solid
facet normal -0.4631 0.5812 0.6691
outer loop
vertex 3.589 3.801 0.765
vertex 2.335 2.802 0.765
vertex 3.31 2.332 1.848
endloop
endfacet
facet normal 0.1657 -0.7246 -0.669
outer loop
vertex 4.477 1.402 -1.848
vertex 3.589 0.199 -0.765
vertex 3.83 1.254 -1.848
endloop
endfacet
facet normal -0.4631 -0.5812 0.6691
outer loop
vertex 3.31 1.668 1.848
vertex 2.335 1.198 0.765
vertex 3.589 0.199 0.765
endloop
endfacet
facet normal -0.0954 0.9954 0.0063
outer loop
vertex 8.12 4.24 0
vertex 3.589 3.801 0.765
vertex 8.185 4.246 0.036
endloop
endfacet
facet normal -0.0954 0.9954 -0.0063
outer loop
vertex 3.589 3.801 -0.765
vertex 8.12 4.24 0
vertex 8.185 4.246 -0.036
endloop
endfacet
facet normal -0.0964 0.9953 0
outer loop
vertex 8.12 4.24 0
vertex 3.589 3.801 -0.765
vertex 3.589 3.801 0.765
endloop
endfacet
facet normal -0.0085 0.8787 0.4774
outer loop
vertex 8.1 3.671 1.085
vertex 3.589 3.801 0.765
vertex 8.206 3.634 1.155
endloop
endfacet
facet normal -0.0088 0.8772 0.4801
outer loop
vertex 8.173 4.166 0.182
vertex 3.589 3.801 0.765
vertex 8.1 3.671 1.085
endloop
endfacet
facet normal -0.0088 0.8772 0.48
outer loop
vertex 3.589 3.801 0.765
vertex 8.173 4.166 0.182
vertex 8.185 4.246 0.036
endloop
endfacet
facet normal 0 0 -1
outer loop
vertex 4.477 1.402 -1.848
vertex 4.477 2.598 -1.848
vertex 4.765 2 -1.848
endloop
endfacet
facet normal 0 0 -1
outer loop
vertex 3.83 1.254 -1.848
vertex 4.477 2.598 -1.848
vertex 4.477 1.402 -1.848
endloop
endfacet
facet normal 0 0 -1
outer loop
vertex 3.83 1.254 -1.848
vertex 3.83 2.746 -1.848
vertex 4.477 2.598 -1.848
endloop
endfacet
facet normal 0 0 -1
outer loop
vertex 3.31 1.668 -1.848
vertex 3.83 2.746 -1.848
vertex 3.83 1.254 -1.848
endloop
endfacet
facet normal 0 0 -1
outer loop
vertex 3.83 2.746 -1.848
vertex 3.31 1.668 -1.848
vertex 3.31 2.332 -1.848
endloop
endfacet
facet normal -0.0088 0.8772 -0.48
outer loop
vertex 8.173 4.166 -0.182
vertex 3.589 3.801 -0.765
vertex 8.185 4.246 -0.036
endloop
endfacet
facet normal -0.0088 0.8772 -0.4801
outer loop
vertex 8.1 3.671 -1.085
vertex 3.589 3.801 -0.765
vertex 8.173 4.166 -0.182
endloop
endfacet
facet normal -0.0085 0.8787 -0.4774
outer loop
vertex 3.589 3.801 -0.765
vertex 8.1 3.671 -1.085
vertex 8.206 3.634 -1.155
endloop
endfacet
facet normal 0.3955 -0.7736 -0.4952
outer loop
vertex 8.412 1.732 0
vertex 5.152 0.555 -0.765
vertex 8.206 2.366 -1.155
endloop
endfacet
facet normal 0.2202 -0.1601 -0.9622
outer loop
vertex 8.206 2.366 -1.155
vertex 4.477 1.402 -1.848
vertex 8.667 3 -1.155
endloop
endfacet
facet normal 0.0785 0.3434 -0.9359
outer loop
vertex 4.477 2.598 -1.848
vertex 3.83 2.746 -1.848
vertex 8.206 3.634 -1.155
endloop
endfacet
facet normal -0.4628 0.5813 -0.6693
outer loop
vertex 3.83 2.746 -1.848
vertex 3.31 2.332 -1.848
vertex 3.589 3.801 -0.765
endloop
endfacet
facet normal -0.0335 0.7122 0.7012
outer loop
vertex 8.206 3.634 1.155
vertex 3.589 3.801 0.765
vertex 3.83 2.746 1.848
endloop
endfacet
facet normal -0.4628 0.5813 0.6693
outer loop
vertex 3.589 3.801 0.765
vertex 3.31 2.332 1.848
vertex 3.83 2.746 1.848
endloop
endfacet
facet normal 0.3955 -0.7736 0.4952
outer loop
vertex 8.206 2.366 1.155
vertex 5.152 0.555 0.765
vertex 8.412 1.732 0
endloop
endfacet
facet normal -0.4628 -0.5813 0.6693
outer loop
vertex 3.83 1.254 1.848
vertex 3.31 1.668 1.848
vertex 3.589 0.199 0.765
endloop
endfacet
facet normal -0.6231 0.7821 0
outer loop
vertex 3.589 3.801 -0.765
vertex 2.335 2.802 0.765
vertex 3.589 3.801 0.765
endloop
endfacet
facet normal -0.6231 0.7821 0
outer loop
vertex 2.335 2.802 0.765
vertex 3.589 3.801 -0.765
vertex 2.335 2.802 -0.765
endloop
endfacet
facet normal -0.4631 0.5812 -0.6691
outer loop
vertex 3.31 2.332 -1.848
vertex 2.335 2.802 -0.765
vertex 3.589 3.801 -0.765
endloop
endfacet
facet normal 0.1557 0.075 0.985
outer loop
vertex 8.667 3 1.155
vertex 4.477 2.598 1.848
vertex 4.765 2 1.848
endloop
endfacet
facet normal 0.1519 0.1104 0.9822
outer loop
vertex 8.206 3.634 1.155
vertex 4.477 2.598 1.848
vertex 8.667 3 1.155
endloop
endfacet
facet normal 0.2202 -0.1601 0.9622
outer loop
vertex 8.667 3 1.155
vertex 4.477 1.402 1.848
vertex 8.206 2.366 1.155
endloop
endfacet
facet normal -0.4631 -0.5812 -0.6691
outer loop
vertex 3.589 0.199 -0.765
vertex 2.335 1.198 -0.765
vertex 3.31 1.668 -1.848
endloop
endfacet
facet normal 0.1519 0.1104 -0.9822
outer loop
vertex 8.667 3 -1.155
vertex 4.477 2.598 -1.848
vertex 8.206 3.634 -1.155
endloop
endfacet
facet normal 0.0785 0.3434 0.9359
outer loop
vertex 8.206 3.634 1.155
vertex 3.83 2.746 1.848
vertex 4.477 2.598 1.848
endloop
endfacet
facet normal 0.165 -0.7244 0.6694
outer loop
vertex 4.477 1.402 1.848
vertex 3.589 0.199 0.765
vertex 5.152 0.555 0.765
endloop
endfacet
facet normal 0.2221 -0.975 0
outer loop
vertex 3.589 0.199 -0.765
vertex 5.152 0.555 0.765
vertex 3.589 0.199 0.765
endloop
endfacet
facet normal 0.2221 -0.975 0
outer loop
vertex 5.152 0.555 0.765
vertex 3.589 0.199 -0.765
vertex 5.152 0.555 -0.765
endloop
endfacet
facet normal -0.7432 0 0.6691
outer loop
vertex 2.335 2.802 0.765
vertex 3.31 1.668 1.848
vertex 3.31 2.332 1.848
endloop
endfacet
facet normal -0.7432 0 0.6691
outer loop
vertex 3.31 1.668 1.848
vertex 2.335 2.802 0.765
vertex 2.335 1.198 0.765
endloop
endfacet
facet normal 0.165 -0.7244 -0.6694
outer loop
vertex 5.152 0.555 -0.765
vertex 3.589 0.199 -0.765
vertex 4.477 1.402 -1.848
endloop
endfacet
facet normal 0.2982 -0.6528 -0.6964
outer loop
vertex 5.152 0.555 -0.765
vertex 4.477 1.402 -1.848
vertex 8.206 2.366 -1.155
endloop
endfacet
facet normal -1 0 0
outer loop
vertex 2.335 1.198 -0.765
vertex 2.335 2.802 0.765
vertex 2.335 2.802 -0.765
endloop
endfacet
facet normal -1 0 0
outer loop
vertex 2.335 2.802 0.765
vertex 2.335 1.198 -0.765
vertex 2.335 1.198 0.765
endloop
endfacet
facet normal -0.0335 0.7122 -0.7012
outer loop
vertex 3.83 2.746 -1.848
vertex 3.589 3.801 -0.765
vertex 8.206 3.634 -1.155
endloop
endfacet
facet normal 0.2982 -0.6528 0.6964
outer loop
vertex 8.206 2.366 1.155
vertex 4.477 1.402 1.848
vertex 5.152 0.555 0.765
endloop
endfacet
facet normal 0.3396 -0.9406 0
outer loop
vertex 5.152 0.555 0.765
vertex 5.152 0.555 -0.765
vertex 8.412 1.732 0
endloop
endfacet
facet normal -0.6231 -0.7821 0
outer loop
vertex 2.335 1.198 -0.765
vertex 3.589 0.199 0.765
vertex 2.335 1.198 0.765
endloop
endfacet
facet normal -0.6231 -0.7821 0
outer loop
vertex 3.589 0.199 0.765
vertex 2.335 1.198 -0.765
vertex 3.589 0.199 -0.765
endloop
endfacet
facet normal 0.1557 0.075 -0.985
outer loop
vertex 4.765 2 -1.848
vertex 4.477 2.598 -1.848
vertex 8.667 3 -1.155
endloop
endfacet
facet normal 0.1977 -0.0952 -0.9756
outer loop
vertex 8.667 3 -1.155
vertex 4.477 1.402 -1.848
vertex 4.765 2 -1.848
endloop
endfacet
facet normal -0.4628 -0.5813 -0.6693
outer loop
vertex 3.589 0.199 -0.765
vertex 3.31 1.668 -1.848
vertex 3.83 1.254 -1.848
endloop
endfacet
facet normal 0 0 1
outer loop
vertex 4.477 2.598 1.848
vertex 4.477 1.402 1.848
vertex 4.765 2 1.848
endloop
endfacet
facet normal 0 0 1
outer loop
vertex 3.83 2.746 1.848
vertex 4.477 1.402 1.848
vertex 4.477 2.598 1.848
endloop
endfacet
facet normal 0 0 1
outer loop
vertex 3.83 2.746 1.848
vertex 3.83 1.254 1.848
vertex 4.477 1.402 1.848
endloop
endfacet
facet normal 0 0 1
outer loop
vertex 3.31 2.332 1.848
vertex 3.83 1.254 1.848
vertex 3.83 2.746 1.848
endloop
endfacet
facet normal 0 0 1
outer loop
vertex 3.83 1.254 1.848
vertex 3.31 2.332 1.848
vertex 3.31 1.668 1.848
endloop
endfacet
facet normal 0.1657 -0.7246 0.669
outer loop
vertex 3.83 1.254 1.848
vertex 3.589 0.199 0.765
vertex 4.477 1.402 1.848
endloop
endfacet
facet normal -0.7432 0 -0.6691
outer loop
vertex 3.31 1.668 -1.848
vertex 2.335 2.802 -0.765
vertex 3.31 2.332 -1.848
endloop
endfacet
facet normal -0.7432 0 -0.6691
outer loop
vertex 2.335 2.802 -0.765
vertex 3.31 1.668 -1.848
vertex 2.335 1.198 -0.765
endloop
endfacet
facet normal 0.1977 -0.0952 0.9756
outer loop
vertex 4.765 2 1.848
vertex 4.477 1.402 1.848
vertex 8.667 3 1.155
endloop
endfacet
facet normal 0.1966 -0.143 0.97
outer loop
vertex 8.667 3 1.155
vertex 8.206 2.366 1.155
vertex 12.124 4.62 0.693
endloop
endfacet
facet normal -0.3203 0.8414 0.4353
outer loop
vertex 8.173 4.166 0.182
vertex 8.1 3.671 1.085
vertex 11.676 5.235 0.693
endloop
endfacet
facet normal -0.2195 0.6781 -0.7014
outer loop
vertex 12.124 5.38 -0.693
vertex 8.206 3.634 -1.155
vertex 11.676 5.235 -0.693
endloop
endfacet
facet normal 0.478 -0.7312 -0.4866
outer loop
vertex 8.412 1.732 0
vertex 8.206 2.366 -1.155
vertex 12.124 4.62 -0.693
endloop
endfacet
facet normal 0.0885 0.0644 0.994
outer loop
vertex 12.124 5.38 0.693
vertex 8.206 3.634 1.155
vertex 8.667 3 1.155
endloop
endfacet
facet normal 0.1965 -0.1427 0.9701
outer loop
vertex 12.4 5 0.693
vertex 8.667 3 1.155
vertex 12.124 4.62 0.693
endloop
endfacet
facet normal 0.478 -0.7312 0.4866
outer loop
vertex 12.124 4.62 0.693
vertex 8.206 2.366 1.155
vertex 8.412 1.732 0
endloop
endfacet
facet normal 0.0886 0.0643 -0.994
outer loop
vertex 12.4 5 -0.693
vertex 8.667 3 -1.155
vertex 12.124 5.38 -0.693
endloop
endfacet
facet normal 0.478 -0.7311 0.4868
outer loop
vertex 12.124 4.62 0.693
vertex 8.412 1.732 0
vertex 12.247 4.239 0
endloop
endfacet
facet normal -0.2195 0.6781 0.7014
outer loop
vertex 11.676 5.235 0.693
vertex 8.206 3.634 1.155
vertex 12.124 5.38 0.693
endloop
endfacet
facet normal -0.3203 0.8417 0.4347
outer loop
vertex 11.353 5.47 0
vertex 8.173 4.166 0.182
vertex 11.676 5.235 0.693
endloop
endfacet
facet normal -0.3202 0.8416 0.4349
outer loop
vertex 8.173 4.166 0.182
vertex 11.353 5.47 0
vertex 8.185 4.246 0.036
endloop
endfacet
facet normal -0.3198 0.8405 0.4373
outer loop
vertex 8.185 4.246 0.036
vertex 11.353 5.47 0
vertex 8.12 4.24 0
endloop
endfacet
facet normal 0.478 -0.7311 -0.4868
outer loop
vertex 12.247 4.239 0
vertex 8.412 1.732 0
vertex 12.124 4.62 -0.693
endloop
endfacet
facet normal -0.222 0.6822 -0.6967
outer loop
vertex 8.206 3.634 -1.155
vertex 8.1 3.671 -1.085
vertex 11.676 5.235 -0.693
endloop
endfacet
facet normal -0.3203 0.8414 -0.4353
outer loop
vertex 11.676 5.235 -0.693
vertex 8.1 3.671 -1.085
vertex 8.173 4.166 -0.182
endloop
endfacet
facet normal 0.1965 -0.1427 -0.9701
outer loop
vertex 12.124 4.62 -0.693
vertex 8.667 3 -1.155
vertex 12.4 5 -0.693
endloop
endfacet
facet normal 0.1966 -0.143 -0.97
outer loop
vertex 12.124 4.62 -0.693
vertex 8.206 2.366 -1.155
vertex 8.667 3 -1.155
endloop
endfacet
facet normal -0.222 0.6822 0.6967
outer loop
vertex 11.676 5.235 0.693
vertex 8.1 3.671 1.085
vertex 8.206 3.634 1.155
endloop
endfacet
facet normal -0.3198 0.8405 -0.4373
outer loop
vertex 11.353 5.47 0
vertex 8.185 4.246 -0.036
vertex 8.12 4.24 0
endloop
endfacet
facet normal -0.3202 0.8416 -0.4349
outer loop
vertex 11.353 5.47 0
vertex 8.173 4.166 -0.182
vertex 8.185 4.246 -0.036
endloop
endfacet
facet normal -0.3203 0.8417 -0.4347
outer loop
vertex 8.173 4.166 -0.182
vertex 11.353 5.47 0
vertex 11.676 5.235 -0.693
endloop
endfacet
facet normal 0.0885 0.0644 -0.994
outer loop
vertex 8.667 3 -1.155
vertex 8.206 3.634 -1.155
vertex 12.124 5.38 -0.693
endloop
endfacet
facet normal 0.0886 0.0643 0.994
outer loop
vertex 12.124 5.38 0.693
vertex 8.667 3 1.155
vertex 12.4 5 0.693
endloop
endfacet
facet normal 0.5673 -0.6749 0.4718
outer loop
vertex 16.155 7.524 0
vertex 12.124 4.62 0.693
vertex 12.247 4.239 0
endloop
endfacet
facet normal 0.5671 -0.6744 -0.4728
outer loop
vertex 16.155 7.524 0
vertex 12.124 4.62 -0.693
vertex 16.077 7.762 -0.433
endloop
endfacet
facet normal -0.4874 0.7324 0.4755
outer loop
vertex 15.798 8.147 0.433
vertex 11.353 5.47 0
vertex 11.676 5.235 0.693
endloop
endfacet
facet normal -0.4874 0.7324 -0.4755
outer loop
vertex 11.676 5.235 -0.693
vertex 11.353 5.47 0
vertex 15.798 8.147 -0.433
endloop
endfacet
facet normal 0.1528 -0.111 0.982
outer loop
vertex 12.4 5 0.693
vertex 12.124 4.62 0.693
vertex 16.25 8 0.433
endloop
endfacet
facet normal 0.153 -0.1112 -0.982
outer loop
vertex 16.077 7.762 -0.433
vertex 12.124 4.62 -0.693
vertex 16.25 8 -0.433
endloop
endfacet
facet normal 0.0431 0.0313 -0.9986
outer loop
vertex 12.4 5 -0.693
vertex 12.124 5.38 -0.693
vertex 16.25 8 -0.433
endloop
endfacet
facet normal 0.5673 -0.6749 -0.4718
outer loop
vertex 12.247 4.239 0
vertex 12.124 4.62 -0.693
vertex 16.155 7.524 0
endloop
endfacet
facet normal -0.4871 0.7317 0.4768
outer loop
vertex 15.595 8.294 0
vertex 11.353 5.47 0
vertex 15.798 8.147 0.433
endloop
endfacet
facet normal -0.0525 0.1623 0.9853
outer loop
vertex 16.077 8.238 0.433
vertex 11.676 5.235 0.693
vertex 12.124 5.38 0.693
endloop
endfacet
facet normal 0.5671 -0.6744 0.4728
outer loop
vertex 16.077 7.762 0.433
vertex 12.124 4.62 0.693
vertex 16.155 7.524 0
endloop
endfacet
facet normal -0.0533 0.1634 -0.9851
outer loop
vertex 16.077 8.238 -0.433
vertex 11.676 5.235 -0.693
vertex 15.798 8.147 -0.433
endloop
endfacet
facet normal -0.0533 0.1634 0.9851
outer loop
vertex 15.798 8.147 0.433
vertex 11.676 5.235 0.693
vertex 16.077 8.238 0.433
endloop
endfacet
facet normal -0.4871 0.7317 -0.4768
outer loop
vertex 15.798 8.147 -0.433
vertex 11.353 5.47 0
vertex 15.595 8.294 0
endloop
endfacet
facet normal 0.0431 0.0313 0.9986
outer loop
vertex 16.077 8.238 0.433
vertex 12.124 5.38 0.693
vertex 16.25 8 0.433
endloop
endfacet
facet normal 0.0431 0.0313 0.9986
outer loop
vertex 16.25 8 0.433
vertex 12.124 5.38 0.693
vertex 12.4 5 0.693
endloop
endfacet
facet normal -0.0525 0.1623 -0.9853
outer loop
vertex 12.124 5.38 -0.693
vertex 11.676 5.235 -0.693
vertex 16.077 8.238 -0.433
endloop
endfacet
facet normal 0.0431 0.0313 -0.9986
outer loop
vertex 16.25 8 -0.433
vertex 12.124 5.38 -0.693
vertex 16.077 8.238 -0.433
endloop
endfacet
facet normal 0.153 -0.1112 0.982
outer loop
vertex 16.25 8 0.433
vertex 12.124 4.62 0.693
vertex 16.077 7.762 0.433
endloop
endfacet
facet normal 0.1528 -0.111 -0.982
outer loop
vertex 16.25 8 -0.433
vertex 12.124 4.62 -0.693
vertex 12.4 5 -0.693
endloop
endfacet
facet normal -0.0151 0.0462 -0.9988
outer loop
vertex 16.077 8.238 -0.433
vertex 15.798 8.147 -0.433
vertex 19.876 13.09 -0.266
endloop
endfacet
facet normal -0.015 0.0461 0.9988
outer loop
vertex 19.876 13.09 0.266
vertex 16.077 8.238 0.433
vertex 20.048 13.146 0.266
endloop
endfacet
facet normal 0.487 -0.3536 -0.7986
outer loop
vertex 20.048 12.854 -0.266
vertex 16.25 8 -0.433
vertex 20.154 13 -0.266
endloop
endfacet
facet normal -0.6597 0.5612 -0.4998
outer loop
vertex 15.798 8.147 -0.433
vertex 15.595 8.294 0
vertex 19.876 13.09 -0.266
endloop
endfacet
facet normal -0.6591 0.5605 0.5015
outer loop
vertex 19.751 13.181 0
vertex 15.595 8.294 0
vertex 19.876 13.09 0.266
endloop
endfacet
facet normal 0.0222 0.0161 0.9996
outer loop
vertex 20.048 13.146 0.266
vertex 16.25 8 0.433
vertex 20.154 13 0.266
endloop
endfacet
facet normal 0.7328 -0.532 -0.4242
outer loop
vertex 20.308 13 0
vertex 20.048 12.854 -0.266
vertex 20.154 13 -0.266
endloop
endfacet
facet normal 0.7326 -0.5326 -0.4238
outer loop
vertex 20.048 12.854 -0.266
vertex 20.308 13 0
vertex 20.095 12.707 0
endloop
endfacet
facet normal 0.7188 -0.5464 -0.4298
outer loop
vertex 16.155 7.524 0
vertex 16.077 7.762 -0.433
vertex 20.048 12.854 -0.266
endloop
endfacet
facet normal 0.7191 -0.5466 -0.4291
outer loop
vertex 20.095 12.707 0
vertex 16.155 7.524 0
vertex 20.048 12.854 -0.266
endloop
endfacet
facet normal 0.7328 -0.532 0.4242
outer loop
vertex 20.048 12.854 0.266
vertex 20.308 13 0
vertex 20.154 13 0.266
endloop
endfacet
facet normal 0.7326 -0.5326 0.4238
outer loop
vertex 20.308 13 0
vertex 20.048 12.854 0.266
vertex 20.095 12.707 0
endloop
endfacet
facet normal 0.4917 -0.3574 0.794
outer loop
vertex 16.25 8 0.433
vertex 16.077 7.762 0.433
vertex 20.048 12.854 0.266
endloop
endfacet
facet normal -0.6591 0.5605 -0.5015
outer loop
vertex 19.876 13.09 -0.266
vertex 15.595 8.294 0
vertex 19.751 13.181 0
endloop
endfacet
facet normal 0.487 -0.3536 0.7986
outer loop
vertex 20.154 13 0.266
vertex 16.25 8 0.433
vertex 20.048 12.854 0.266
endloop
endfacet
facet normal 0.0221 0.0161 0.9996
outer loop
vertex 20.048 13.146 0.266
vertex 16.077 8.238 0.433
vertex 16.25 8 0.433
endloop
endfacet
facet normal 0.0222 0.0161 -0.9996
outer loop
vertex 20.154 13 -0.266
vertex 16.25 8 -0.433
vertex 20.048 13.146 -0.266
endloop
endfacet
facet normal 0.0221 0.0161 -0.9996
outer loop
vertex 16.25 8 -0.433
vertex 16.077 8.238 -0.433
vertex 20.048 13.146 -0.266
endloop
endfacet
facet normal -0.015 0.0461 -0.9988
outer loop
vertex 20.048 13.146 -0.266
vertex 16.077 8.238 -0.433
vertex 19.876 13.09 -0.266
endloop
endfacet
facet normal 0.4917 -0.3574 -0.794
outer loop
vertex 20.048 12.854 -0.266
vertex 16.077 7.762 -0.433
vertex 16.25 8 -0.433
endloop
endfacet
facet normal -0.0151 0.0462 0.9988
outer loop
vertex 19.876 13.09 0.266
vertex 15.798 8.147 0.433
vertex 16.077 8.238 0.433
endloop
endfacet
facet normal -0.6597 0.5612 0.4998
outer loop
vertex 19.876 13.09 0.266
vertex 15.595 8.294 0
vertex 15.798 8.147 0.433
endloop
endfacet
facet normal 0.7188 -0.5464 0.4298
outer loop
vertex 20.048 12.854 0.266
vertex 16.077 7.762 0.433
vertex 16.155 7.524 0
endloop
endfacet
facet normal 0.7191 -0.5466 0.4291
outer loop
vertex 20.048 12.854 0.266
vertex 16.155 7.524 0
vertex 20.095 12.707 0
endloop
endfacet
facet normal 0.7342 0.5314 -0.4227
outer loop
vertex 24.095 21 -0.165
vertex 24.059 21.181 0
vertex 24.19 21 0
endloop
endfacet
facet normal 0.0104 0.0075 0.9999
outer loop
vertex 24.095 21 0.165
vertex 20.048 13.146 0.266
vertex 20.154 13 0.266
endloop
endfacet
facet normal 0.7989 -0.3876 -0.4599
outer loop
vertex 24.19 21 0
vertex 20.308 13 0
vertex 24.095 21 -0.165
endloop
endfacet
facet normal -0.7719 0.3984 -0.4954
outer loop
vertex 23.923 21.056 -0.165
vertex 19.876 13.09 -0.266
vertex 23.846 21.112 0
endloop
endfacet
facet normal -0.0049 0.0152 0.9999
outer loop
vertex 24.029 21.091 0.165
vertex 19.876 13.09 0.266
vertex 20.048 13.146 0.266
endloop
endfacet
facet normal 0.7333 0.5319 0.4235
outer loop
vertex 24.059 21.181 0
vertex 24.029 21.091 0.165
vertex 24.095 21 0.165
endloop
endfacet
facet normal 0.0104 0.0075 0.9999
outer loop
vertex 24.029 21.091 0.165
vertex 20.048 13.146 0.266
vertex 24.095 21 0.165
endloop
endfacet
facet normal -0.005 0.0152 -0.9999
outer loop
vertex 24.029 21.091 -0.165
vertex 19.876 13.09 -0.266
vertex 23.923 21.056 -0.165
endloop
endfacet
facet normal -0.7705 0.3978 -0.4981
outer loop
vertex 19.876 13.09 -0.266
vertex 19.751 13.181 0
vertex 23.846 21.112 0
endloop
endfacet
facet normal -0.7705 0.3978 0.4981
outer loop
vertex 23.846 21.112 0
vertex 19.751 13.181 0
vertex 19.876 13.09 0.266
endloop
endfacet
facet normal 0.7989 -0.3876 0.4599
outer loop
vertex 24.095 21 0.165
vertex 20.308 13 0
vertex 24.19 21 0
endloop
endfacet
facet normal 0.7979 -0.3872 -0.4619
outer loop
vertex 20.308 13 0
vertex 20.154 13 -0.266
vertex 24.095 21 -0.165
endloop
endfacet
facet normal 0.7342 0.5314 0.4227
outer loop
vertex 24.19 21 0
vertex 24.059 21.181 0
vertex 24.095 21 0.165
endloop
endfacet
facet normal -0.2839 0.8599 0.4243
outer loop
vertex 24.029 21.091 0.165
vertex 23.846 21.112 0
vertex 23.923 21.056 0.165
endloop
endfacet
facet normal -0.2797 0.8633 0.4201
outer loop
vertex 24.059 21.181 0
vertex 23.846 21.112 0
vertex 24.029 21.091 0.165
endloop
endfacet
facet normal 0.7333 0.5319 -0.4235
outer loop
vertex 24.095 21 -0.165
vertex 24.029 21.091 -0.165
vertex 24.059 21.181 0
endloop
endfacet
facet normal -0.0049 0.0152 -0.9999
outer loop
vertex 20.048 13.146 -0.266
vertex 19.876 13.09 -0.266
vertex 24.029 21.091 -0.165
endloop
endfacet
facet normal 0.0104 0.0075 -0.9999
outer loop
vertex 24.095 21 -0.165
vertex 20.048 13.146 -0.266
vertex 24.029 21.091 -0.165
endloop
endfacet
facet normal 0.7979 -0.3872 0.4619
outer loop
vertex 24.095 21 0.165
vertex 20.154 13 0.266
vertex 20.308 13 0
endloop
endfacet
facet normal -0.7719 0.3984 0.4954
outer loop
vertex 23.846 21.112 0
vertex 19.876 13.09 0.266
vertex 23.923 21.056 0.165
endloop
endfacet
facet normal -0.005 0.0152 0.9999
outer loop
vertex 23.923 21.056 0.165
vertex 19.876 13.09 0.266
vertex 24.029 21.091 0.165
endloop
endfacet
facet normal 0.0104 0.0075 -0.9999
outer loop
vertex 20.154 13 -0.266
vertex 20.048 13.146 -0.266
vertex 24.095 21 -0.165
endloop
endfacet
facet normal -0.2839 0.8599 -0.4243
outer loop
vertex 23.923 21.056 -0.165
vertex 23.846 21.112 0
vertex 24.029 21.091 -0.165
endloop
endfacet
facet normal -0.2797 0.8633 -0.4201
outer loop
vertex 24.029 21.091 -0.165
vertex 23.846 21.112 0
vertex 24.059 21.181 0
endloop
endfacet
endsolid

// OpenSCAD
module wing(length=30) {
    // body...
    rotate([0, 90, 0]) {
        hull(){
        cylinder(r=2, h=length, center=true);
        translate([1.8, 20, 0]) {
            cylinder(r=.2, h=length, center=true);
            }
        }
    }
} 

//wing();
function Fib(f) =   f < 2  ? 1 :  Fib(f-1) + Fib(f-2);;
function FibSeq(Len) =  [for (a = [1 : Len])  Fib(a)];

module bentwing(Length=30, bend=20)
{
segment_number=6;
baseSize=4;
sweptness=4;
angle= FibSeq(segment_number+1);
    for (i=[1:segment_number-1]) {
        j=i+1;
        echo(angle[i],angle[j]);
         echo(angle[i]/angle[j]);
        hull()
            {
                translate([sweptness*i,angle[i],0])
                sphere(r= baseSize/angle[i]);
                translate([sweptness*j,angle[j],0])
                sphere(r=baseSize/angle[j],center=true);
                
            }
        }

    
    
 }


bentwing();
